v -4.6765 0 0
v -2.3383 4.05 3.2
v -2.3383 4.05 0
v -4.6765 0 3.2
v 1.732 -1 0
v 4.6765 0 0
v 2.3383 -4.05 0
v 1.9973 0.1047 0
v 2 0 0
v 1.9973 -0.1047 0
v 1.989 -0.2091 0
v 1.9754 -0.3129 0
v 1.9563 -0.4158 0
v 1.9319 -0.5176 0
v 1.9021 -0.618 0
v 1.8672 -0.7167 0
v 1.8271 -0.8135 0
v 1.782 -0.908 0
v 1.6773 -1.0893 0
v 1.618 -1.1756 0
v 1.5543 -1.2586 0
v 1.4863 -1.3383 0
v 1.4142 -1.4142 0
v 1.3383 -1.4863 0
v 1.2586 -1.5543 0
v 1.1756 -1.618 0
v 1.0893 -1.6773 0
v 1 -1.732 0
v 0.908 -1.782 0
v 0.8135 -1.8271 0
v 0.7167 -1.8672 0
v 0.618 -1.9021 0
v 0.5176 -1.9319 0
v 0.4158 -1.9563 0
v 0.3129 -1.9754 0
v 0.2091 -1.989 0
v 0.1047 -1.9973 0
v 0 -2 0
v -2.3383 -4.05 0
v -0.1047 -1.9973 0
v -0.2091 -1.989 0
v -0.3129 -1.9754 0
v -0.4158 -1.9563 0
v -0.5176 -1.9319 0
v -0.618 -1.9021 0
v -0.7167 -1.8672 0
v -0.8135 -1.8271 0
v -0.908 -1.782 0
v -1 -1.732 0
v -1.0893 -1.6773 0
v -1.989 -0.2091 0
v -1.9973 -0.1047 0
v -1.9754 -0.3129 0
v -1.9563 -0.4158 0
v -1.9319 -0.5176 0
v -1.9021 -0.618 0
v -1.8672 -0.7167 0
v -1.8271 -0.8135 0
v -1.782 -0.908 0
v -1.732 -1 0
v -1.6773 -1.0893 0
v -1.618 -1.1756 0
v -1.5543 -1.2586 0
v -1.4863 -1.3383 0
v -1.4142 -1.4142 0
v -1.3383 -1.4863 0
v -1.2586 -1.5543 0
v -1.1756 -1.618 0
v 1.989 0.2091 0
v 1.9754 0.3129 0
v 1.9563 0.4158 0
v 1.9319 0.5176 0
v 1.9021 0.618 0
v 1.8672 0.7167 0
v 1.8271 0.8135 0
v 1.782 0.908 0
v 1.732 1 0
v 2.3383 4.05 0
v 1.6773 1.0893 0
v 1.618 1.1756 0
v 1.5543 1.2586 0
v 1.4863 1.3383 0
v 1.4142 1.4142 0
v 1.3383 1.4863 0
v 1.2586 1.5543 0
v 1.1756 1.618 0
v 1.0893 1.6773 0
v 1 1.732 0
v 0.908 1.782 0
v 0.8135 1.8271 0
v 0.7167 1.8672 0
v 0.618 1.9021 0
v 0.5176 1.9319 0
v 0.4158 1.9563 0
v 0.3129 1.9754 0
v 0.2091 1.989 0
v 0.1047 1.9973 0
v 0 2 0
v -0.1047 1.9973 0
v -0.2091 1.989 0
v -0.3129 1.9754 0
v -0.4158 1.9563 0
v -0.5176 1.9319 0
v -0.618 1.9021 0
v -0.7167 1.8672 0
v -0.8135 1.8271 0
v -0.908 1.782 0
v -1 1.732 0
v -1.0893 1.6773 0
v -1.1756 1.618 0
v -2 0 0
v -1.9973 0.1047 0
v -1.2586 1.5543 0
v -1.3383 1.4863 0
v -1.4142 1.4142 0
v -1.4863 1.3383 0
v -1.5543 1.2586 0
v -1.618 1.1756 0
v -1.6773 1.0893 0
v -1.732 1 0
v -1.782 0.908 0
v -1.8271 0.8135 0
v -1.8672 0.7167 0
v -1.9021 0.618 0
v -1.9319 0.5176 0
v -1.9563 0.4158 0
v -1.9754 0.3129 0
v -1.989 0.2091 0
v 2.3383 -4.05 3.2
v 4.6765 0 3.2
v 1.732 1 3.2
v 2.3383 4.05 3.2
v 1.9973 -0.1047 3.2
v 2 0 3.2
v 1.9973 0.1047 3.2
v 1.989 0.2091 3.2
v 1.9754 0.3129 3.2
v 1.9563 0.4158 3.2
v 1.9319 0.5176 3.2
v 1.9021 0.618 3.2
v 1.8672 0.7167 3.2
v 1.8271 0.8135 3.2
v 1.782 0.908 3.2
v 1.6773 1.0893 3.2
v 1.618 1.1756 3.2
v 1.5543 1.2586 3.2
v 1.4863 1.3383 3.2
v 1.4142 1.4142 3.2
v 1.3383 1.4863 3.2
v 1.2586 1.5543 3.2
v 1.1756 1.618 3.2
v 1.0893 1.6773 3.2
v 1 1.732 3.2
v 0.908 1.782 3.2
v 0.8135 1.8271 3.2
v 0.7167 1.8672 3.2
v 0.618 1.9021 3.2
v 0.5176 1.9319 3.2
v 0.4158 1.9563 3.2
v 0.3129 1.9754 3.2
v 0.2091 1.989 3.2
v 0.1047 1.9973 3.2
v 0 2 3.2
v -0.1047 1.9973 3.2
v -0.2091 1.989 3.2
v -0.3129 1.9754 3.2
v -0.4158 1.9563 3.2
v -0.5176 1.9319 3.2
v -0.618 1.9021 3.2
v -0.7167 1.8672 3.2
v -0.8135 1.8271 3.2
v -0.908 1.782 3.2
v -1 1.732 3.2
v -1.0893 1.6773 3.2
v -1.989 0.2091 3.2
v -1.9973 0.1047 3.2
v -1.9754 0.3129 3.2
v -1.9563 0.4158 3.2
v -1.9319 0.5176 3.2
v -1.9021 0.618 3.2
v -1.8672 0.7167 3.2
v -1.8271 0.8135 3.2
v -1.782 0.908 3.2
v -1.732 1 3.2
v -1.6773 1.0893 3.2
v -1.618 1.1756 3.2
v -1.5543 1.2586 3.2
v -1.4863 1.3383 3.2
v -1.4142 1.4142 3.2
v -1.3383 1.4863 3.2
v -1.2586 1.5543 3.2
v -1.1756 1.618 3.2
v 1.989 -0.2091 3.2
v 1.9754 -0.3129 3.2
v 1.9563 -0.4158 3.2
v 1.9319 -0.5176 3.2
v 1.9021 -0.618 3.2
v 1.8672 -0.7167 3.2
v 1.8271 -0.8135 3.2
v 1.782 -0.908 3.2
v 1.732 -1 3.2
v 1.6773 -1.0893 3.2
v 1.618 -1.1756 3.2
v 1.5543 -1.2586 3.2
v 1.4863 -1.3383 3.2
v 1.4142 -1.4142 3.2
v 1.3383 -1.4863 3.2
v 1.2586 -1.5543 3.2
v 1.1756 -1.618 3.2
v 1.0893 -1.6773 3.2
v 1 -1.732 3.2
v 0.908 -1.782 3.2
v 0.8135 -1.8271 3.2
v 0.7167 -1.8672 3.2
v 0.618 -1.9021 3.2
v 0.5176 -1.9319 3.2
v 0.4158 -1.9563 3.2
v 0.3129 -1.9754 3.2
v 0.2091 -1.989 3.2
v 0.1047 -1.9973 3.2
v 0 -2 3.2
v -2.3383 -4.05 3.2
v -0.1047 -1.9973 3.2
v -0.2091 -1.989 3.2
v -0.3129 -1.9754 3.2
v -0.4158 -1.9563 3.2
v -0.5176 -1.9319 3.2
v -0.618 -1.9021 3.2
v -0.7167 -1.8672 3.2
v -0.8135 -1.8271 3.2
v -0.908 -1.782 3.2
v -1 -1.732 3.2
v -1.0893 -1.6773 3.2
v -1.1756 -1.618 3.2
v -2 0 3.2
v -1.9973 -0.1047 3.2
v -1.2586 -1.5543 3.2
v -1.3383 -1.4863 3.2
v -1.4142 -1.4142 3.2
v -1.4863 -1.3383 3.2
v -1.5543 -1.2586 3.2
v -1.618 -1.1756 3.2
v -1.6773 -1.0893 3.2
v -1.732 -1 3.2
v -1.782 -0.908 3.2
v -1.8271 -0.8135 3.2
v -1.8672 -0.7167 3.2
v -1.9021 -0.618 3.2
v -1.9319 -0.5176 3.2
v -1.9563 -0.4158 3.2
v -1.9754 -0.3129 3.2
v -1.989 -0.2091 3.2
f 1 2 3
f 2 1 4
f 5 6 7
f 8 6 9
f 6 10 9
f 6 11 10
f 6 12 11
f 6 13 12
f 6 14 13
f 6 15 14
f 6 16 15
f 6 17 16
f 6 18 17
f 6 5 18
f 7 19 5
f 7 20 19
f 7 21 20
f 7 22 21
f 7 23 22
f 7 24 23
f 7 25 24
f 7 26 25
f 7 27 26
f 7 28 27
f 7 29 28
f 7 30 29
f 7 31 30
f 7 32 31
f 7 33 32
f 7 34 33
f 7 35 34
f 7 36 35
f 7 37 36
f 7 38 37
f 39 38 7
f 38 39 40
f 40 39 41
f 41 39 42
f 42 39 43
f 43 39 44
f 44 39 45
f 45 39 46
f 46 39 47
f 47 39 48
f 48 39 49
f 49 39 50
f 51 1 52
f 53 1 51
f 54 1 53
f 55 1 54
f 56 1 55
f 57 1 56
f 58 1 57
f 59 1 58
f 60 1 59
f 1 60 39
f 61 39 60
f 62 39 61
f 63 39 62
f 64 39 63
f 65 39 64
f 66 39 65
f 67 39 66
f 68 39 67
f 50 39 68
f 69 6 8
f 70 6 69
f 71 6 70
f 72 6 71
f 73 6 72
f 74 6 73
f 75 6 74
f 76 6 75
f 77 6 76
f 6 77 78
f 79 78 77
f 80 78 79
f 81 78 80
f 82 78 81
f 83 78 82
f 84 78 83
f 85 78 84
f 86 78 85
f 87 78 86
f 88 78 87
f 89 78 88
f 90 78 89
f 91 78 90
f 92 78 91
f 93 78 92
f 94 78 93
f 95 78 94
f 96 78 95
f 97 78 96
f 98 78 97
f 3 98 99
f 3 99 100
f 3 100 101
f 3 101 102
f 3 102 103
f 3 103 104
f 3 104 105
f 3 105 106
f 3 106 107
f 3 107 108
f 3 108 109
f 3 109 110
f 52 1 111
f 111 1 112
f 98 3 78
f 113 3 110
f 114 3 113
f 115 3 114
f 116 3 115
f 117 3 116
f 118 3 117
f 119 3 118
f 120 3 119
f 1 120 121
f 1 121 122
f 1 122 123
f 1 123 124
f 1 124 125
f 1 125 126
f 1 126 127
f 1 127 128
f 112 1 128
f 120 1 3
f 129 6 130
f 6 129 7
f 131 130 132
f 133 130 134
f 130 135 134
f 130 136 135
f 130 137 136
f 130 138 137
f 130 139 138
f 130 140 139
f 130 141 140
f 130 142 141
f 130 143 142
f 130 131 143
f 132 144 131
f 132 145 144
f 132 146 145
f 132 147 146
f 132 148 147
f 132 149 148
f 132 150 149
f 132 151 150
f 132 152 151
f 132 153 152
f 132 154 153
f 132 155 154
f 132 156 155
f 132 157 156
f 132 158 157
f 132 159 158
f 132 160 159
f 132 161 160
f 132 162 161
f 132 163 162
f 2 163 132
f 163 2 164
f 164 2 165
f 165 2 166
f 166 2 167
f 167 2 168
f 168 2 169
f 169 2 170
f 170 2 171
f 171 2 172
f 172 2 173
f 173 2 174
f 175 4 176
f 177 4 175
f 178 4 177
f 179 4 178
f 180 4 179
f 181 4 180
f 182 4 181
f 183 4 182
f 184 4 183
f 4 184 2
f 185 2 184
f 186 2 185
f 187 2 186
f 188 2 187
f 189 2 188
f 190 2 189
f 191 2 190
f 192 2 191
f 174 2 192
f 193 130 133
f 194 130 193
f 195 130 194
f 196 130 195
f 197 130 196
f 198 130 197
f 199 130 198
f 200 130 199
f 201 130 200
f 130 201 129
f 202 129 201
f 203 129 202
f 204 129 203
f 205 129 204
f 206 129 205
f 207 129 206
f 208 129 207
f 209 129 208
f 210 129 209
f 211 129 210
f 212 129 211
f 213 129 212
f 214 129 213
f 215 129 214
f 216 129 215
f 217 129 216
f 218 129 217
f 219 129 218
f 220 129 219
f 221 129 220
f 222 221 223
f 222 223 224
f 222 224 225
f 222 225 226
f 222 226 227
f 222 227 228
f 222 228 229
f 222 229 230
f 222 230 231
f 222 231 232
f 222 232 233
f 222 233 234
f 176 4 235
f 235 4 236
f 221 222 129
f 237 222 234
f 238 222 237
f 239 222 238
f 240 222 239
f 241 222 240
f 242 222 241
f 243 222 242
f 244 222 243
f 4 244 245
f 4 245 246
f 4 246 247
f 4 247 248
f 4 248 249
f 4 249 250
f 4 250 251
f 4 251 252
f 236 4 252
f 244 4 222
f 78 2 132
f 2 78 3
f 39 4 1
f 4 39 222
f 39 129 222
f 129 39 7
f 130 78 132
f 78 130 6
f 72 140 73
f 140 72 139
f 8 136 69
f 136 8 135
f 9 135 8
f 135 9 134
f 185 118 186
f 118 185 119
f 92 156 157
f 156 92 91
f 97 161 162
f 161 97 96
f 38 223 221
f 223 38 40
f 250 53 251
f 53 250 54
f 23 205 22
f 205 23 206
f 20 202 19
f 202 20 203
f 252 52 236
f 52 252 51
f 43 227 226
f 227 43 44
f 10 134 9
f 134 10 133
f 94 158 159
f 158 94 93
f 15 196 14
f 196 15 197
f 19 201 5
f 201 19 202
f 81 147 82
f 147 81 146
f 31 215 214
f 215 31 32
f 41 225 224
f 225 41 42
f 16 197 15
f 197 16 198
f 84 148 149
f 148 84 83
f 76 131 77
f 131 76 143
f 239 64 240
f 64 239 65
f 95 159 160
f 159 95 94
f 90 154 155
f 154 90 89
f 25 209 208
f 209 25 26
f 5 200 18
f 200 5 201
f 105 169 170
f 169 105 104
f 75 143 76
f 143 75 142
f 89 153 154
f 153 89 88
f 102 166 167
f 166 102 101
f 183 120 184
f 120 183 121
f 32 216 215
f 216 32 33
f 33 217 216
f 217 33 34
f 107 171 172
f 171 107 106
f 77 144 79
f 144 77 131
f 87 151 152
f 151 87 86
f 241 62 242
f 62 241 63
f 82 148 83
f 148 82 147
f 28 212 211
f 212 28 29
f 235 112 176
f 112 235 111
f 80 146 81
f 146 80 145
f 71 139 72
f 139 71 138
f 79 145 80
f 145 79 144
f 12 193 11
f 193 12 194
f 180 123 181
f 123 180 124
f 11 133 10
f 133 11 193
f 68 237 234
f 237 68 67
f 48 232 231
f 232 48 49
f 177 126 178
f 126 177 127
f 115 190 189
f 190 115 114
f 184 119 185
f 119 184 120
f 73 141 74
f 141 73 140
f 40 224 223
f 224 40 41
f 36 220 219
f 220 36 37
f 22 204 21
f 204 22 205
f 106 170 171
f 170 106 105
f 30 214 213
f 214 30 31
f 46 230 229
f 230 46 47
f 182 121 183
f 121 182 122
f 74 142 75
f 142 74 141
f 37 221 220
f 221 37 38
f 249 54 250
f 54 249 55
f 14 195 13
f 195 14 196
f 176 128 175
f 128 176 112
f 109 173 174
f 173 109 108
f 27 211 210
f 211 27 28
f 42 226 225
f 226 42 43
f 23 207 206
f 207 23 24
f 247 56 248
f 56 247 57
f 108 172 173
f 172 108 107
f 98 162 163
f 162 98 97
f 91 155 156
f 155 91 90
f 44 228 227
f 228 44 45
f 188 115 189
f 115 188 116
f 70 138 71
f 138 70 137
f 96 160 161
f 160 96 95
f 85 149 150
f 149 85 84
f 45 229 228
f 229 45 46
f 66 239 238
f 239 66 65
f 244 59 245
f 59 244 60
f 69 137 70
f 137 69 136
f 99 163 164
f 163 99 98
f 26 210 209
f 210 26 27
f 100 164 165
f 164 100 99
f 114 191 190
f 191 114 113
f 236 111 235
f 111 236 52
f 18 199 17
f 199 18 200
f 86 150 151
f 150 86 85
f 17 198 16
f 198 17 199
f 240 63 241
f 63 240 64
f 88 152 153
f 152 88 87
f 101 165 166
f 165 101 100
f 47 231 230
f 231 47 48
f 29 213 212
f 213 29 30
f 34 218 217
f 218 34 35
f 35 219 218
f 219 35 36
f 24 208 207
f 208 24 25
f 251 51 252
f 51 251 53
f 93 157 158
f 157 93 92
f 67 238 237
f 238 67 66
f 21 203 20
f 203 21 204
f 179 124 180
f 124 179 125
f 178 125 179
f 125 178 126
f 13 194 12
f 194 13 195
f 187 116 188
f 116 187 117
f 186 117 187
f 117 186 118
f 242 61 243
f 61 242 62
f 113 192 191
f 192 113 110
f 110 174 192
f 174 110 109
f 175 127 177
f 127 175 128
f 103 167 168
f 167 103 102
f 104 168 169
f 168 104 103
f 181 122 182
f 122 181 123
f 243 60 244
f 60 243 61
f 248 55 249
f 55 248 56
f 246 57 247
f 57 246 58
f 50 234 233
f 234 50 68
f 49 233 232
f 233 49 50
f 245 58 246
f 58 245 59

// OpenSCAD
$fn = 120;

across_flats = 8.1;   // mm
thickness    = 3.2;   // mm
hole_d       = 4.0;   // mm (clearance as specified)

module hex_prism_af(af, h){
    // For a regular hexagon: across_flats = 2 * apothem
    // Circumradius R = apothem / cos(30°) = (af/2)/cos(30°)
    R = (af/2) / cos(30);
    linear_extrude(height=h)
        polygon(points=[for(i=[0:5]) [R*cos(60*i), R*sin(60*i)]]);
}

difference() {
    hex_prism_af(across_flats, thickness);
    translate([0,0,-0.2])
        cylinder(d=hole_d, h=thickness+0.4);
}
